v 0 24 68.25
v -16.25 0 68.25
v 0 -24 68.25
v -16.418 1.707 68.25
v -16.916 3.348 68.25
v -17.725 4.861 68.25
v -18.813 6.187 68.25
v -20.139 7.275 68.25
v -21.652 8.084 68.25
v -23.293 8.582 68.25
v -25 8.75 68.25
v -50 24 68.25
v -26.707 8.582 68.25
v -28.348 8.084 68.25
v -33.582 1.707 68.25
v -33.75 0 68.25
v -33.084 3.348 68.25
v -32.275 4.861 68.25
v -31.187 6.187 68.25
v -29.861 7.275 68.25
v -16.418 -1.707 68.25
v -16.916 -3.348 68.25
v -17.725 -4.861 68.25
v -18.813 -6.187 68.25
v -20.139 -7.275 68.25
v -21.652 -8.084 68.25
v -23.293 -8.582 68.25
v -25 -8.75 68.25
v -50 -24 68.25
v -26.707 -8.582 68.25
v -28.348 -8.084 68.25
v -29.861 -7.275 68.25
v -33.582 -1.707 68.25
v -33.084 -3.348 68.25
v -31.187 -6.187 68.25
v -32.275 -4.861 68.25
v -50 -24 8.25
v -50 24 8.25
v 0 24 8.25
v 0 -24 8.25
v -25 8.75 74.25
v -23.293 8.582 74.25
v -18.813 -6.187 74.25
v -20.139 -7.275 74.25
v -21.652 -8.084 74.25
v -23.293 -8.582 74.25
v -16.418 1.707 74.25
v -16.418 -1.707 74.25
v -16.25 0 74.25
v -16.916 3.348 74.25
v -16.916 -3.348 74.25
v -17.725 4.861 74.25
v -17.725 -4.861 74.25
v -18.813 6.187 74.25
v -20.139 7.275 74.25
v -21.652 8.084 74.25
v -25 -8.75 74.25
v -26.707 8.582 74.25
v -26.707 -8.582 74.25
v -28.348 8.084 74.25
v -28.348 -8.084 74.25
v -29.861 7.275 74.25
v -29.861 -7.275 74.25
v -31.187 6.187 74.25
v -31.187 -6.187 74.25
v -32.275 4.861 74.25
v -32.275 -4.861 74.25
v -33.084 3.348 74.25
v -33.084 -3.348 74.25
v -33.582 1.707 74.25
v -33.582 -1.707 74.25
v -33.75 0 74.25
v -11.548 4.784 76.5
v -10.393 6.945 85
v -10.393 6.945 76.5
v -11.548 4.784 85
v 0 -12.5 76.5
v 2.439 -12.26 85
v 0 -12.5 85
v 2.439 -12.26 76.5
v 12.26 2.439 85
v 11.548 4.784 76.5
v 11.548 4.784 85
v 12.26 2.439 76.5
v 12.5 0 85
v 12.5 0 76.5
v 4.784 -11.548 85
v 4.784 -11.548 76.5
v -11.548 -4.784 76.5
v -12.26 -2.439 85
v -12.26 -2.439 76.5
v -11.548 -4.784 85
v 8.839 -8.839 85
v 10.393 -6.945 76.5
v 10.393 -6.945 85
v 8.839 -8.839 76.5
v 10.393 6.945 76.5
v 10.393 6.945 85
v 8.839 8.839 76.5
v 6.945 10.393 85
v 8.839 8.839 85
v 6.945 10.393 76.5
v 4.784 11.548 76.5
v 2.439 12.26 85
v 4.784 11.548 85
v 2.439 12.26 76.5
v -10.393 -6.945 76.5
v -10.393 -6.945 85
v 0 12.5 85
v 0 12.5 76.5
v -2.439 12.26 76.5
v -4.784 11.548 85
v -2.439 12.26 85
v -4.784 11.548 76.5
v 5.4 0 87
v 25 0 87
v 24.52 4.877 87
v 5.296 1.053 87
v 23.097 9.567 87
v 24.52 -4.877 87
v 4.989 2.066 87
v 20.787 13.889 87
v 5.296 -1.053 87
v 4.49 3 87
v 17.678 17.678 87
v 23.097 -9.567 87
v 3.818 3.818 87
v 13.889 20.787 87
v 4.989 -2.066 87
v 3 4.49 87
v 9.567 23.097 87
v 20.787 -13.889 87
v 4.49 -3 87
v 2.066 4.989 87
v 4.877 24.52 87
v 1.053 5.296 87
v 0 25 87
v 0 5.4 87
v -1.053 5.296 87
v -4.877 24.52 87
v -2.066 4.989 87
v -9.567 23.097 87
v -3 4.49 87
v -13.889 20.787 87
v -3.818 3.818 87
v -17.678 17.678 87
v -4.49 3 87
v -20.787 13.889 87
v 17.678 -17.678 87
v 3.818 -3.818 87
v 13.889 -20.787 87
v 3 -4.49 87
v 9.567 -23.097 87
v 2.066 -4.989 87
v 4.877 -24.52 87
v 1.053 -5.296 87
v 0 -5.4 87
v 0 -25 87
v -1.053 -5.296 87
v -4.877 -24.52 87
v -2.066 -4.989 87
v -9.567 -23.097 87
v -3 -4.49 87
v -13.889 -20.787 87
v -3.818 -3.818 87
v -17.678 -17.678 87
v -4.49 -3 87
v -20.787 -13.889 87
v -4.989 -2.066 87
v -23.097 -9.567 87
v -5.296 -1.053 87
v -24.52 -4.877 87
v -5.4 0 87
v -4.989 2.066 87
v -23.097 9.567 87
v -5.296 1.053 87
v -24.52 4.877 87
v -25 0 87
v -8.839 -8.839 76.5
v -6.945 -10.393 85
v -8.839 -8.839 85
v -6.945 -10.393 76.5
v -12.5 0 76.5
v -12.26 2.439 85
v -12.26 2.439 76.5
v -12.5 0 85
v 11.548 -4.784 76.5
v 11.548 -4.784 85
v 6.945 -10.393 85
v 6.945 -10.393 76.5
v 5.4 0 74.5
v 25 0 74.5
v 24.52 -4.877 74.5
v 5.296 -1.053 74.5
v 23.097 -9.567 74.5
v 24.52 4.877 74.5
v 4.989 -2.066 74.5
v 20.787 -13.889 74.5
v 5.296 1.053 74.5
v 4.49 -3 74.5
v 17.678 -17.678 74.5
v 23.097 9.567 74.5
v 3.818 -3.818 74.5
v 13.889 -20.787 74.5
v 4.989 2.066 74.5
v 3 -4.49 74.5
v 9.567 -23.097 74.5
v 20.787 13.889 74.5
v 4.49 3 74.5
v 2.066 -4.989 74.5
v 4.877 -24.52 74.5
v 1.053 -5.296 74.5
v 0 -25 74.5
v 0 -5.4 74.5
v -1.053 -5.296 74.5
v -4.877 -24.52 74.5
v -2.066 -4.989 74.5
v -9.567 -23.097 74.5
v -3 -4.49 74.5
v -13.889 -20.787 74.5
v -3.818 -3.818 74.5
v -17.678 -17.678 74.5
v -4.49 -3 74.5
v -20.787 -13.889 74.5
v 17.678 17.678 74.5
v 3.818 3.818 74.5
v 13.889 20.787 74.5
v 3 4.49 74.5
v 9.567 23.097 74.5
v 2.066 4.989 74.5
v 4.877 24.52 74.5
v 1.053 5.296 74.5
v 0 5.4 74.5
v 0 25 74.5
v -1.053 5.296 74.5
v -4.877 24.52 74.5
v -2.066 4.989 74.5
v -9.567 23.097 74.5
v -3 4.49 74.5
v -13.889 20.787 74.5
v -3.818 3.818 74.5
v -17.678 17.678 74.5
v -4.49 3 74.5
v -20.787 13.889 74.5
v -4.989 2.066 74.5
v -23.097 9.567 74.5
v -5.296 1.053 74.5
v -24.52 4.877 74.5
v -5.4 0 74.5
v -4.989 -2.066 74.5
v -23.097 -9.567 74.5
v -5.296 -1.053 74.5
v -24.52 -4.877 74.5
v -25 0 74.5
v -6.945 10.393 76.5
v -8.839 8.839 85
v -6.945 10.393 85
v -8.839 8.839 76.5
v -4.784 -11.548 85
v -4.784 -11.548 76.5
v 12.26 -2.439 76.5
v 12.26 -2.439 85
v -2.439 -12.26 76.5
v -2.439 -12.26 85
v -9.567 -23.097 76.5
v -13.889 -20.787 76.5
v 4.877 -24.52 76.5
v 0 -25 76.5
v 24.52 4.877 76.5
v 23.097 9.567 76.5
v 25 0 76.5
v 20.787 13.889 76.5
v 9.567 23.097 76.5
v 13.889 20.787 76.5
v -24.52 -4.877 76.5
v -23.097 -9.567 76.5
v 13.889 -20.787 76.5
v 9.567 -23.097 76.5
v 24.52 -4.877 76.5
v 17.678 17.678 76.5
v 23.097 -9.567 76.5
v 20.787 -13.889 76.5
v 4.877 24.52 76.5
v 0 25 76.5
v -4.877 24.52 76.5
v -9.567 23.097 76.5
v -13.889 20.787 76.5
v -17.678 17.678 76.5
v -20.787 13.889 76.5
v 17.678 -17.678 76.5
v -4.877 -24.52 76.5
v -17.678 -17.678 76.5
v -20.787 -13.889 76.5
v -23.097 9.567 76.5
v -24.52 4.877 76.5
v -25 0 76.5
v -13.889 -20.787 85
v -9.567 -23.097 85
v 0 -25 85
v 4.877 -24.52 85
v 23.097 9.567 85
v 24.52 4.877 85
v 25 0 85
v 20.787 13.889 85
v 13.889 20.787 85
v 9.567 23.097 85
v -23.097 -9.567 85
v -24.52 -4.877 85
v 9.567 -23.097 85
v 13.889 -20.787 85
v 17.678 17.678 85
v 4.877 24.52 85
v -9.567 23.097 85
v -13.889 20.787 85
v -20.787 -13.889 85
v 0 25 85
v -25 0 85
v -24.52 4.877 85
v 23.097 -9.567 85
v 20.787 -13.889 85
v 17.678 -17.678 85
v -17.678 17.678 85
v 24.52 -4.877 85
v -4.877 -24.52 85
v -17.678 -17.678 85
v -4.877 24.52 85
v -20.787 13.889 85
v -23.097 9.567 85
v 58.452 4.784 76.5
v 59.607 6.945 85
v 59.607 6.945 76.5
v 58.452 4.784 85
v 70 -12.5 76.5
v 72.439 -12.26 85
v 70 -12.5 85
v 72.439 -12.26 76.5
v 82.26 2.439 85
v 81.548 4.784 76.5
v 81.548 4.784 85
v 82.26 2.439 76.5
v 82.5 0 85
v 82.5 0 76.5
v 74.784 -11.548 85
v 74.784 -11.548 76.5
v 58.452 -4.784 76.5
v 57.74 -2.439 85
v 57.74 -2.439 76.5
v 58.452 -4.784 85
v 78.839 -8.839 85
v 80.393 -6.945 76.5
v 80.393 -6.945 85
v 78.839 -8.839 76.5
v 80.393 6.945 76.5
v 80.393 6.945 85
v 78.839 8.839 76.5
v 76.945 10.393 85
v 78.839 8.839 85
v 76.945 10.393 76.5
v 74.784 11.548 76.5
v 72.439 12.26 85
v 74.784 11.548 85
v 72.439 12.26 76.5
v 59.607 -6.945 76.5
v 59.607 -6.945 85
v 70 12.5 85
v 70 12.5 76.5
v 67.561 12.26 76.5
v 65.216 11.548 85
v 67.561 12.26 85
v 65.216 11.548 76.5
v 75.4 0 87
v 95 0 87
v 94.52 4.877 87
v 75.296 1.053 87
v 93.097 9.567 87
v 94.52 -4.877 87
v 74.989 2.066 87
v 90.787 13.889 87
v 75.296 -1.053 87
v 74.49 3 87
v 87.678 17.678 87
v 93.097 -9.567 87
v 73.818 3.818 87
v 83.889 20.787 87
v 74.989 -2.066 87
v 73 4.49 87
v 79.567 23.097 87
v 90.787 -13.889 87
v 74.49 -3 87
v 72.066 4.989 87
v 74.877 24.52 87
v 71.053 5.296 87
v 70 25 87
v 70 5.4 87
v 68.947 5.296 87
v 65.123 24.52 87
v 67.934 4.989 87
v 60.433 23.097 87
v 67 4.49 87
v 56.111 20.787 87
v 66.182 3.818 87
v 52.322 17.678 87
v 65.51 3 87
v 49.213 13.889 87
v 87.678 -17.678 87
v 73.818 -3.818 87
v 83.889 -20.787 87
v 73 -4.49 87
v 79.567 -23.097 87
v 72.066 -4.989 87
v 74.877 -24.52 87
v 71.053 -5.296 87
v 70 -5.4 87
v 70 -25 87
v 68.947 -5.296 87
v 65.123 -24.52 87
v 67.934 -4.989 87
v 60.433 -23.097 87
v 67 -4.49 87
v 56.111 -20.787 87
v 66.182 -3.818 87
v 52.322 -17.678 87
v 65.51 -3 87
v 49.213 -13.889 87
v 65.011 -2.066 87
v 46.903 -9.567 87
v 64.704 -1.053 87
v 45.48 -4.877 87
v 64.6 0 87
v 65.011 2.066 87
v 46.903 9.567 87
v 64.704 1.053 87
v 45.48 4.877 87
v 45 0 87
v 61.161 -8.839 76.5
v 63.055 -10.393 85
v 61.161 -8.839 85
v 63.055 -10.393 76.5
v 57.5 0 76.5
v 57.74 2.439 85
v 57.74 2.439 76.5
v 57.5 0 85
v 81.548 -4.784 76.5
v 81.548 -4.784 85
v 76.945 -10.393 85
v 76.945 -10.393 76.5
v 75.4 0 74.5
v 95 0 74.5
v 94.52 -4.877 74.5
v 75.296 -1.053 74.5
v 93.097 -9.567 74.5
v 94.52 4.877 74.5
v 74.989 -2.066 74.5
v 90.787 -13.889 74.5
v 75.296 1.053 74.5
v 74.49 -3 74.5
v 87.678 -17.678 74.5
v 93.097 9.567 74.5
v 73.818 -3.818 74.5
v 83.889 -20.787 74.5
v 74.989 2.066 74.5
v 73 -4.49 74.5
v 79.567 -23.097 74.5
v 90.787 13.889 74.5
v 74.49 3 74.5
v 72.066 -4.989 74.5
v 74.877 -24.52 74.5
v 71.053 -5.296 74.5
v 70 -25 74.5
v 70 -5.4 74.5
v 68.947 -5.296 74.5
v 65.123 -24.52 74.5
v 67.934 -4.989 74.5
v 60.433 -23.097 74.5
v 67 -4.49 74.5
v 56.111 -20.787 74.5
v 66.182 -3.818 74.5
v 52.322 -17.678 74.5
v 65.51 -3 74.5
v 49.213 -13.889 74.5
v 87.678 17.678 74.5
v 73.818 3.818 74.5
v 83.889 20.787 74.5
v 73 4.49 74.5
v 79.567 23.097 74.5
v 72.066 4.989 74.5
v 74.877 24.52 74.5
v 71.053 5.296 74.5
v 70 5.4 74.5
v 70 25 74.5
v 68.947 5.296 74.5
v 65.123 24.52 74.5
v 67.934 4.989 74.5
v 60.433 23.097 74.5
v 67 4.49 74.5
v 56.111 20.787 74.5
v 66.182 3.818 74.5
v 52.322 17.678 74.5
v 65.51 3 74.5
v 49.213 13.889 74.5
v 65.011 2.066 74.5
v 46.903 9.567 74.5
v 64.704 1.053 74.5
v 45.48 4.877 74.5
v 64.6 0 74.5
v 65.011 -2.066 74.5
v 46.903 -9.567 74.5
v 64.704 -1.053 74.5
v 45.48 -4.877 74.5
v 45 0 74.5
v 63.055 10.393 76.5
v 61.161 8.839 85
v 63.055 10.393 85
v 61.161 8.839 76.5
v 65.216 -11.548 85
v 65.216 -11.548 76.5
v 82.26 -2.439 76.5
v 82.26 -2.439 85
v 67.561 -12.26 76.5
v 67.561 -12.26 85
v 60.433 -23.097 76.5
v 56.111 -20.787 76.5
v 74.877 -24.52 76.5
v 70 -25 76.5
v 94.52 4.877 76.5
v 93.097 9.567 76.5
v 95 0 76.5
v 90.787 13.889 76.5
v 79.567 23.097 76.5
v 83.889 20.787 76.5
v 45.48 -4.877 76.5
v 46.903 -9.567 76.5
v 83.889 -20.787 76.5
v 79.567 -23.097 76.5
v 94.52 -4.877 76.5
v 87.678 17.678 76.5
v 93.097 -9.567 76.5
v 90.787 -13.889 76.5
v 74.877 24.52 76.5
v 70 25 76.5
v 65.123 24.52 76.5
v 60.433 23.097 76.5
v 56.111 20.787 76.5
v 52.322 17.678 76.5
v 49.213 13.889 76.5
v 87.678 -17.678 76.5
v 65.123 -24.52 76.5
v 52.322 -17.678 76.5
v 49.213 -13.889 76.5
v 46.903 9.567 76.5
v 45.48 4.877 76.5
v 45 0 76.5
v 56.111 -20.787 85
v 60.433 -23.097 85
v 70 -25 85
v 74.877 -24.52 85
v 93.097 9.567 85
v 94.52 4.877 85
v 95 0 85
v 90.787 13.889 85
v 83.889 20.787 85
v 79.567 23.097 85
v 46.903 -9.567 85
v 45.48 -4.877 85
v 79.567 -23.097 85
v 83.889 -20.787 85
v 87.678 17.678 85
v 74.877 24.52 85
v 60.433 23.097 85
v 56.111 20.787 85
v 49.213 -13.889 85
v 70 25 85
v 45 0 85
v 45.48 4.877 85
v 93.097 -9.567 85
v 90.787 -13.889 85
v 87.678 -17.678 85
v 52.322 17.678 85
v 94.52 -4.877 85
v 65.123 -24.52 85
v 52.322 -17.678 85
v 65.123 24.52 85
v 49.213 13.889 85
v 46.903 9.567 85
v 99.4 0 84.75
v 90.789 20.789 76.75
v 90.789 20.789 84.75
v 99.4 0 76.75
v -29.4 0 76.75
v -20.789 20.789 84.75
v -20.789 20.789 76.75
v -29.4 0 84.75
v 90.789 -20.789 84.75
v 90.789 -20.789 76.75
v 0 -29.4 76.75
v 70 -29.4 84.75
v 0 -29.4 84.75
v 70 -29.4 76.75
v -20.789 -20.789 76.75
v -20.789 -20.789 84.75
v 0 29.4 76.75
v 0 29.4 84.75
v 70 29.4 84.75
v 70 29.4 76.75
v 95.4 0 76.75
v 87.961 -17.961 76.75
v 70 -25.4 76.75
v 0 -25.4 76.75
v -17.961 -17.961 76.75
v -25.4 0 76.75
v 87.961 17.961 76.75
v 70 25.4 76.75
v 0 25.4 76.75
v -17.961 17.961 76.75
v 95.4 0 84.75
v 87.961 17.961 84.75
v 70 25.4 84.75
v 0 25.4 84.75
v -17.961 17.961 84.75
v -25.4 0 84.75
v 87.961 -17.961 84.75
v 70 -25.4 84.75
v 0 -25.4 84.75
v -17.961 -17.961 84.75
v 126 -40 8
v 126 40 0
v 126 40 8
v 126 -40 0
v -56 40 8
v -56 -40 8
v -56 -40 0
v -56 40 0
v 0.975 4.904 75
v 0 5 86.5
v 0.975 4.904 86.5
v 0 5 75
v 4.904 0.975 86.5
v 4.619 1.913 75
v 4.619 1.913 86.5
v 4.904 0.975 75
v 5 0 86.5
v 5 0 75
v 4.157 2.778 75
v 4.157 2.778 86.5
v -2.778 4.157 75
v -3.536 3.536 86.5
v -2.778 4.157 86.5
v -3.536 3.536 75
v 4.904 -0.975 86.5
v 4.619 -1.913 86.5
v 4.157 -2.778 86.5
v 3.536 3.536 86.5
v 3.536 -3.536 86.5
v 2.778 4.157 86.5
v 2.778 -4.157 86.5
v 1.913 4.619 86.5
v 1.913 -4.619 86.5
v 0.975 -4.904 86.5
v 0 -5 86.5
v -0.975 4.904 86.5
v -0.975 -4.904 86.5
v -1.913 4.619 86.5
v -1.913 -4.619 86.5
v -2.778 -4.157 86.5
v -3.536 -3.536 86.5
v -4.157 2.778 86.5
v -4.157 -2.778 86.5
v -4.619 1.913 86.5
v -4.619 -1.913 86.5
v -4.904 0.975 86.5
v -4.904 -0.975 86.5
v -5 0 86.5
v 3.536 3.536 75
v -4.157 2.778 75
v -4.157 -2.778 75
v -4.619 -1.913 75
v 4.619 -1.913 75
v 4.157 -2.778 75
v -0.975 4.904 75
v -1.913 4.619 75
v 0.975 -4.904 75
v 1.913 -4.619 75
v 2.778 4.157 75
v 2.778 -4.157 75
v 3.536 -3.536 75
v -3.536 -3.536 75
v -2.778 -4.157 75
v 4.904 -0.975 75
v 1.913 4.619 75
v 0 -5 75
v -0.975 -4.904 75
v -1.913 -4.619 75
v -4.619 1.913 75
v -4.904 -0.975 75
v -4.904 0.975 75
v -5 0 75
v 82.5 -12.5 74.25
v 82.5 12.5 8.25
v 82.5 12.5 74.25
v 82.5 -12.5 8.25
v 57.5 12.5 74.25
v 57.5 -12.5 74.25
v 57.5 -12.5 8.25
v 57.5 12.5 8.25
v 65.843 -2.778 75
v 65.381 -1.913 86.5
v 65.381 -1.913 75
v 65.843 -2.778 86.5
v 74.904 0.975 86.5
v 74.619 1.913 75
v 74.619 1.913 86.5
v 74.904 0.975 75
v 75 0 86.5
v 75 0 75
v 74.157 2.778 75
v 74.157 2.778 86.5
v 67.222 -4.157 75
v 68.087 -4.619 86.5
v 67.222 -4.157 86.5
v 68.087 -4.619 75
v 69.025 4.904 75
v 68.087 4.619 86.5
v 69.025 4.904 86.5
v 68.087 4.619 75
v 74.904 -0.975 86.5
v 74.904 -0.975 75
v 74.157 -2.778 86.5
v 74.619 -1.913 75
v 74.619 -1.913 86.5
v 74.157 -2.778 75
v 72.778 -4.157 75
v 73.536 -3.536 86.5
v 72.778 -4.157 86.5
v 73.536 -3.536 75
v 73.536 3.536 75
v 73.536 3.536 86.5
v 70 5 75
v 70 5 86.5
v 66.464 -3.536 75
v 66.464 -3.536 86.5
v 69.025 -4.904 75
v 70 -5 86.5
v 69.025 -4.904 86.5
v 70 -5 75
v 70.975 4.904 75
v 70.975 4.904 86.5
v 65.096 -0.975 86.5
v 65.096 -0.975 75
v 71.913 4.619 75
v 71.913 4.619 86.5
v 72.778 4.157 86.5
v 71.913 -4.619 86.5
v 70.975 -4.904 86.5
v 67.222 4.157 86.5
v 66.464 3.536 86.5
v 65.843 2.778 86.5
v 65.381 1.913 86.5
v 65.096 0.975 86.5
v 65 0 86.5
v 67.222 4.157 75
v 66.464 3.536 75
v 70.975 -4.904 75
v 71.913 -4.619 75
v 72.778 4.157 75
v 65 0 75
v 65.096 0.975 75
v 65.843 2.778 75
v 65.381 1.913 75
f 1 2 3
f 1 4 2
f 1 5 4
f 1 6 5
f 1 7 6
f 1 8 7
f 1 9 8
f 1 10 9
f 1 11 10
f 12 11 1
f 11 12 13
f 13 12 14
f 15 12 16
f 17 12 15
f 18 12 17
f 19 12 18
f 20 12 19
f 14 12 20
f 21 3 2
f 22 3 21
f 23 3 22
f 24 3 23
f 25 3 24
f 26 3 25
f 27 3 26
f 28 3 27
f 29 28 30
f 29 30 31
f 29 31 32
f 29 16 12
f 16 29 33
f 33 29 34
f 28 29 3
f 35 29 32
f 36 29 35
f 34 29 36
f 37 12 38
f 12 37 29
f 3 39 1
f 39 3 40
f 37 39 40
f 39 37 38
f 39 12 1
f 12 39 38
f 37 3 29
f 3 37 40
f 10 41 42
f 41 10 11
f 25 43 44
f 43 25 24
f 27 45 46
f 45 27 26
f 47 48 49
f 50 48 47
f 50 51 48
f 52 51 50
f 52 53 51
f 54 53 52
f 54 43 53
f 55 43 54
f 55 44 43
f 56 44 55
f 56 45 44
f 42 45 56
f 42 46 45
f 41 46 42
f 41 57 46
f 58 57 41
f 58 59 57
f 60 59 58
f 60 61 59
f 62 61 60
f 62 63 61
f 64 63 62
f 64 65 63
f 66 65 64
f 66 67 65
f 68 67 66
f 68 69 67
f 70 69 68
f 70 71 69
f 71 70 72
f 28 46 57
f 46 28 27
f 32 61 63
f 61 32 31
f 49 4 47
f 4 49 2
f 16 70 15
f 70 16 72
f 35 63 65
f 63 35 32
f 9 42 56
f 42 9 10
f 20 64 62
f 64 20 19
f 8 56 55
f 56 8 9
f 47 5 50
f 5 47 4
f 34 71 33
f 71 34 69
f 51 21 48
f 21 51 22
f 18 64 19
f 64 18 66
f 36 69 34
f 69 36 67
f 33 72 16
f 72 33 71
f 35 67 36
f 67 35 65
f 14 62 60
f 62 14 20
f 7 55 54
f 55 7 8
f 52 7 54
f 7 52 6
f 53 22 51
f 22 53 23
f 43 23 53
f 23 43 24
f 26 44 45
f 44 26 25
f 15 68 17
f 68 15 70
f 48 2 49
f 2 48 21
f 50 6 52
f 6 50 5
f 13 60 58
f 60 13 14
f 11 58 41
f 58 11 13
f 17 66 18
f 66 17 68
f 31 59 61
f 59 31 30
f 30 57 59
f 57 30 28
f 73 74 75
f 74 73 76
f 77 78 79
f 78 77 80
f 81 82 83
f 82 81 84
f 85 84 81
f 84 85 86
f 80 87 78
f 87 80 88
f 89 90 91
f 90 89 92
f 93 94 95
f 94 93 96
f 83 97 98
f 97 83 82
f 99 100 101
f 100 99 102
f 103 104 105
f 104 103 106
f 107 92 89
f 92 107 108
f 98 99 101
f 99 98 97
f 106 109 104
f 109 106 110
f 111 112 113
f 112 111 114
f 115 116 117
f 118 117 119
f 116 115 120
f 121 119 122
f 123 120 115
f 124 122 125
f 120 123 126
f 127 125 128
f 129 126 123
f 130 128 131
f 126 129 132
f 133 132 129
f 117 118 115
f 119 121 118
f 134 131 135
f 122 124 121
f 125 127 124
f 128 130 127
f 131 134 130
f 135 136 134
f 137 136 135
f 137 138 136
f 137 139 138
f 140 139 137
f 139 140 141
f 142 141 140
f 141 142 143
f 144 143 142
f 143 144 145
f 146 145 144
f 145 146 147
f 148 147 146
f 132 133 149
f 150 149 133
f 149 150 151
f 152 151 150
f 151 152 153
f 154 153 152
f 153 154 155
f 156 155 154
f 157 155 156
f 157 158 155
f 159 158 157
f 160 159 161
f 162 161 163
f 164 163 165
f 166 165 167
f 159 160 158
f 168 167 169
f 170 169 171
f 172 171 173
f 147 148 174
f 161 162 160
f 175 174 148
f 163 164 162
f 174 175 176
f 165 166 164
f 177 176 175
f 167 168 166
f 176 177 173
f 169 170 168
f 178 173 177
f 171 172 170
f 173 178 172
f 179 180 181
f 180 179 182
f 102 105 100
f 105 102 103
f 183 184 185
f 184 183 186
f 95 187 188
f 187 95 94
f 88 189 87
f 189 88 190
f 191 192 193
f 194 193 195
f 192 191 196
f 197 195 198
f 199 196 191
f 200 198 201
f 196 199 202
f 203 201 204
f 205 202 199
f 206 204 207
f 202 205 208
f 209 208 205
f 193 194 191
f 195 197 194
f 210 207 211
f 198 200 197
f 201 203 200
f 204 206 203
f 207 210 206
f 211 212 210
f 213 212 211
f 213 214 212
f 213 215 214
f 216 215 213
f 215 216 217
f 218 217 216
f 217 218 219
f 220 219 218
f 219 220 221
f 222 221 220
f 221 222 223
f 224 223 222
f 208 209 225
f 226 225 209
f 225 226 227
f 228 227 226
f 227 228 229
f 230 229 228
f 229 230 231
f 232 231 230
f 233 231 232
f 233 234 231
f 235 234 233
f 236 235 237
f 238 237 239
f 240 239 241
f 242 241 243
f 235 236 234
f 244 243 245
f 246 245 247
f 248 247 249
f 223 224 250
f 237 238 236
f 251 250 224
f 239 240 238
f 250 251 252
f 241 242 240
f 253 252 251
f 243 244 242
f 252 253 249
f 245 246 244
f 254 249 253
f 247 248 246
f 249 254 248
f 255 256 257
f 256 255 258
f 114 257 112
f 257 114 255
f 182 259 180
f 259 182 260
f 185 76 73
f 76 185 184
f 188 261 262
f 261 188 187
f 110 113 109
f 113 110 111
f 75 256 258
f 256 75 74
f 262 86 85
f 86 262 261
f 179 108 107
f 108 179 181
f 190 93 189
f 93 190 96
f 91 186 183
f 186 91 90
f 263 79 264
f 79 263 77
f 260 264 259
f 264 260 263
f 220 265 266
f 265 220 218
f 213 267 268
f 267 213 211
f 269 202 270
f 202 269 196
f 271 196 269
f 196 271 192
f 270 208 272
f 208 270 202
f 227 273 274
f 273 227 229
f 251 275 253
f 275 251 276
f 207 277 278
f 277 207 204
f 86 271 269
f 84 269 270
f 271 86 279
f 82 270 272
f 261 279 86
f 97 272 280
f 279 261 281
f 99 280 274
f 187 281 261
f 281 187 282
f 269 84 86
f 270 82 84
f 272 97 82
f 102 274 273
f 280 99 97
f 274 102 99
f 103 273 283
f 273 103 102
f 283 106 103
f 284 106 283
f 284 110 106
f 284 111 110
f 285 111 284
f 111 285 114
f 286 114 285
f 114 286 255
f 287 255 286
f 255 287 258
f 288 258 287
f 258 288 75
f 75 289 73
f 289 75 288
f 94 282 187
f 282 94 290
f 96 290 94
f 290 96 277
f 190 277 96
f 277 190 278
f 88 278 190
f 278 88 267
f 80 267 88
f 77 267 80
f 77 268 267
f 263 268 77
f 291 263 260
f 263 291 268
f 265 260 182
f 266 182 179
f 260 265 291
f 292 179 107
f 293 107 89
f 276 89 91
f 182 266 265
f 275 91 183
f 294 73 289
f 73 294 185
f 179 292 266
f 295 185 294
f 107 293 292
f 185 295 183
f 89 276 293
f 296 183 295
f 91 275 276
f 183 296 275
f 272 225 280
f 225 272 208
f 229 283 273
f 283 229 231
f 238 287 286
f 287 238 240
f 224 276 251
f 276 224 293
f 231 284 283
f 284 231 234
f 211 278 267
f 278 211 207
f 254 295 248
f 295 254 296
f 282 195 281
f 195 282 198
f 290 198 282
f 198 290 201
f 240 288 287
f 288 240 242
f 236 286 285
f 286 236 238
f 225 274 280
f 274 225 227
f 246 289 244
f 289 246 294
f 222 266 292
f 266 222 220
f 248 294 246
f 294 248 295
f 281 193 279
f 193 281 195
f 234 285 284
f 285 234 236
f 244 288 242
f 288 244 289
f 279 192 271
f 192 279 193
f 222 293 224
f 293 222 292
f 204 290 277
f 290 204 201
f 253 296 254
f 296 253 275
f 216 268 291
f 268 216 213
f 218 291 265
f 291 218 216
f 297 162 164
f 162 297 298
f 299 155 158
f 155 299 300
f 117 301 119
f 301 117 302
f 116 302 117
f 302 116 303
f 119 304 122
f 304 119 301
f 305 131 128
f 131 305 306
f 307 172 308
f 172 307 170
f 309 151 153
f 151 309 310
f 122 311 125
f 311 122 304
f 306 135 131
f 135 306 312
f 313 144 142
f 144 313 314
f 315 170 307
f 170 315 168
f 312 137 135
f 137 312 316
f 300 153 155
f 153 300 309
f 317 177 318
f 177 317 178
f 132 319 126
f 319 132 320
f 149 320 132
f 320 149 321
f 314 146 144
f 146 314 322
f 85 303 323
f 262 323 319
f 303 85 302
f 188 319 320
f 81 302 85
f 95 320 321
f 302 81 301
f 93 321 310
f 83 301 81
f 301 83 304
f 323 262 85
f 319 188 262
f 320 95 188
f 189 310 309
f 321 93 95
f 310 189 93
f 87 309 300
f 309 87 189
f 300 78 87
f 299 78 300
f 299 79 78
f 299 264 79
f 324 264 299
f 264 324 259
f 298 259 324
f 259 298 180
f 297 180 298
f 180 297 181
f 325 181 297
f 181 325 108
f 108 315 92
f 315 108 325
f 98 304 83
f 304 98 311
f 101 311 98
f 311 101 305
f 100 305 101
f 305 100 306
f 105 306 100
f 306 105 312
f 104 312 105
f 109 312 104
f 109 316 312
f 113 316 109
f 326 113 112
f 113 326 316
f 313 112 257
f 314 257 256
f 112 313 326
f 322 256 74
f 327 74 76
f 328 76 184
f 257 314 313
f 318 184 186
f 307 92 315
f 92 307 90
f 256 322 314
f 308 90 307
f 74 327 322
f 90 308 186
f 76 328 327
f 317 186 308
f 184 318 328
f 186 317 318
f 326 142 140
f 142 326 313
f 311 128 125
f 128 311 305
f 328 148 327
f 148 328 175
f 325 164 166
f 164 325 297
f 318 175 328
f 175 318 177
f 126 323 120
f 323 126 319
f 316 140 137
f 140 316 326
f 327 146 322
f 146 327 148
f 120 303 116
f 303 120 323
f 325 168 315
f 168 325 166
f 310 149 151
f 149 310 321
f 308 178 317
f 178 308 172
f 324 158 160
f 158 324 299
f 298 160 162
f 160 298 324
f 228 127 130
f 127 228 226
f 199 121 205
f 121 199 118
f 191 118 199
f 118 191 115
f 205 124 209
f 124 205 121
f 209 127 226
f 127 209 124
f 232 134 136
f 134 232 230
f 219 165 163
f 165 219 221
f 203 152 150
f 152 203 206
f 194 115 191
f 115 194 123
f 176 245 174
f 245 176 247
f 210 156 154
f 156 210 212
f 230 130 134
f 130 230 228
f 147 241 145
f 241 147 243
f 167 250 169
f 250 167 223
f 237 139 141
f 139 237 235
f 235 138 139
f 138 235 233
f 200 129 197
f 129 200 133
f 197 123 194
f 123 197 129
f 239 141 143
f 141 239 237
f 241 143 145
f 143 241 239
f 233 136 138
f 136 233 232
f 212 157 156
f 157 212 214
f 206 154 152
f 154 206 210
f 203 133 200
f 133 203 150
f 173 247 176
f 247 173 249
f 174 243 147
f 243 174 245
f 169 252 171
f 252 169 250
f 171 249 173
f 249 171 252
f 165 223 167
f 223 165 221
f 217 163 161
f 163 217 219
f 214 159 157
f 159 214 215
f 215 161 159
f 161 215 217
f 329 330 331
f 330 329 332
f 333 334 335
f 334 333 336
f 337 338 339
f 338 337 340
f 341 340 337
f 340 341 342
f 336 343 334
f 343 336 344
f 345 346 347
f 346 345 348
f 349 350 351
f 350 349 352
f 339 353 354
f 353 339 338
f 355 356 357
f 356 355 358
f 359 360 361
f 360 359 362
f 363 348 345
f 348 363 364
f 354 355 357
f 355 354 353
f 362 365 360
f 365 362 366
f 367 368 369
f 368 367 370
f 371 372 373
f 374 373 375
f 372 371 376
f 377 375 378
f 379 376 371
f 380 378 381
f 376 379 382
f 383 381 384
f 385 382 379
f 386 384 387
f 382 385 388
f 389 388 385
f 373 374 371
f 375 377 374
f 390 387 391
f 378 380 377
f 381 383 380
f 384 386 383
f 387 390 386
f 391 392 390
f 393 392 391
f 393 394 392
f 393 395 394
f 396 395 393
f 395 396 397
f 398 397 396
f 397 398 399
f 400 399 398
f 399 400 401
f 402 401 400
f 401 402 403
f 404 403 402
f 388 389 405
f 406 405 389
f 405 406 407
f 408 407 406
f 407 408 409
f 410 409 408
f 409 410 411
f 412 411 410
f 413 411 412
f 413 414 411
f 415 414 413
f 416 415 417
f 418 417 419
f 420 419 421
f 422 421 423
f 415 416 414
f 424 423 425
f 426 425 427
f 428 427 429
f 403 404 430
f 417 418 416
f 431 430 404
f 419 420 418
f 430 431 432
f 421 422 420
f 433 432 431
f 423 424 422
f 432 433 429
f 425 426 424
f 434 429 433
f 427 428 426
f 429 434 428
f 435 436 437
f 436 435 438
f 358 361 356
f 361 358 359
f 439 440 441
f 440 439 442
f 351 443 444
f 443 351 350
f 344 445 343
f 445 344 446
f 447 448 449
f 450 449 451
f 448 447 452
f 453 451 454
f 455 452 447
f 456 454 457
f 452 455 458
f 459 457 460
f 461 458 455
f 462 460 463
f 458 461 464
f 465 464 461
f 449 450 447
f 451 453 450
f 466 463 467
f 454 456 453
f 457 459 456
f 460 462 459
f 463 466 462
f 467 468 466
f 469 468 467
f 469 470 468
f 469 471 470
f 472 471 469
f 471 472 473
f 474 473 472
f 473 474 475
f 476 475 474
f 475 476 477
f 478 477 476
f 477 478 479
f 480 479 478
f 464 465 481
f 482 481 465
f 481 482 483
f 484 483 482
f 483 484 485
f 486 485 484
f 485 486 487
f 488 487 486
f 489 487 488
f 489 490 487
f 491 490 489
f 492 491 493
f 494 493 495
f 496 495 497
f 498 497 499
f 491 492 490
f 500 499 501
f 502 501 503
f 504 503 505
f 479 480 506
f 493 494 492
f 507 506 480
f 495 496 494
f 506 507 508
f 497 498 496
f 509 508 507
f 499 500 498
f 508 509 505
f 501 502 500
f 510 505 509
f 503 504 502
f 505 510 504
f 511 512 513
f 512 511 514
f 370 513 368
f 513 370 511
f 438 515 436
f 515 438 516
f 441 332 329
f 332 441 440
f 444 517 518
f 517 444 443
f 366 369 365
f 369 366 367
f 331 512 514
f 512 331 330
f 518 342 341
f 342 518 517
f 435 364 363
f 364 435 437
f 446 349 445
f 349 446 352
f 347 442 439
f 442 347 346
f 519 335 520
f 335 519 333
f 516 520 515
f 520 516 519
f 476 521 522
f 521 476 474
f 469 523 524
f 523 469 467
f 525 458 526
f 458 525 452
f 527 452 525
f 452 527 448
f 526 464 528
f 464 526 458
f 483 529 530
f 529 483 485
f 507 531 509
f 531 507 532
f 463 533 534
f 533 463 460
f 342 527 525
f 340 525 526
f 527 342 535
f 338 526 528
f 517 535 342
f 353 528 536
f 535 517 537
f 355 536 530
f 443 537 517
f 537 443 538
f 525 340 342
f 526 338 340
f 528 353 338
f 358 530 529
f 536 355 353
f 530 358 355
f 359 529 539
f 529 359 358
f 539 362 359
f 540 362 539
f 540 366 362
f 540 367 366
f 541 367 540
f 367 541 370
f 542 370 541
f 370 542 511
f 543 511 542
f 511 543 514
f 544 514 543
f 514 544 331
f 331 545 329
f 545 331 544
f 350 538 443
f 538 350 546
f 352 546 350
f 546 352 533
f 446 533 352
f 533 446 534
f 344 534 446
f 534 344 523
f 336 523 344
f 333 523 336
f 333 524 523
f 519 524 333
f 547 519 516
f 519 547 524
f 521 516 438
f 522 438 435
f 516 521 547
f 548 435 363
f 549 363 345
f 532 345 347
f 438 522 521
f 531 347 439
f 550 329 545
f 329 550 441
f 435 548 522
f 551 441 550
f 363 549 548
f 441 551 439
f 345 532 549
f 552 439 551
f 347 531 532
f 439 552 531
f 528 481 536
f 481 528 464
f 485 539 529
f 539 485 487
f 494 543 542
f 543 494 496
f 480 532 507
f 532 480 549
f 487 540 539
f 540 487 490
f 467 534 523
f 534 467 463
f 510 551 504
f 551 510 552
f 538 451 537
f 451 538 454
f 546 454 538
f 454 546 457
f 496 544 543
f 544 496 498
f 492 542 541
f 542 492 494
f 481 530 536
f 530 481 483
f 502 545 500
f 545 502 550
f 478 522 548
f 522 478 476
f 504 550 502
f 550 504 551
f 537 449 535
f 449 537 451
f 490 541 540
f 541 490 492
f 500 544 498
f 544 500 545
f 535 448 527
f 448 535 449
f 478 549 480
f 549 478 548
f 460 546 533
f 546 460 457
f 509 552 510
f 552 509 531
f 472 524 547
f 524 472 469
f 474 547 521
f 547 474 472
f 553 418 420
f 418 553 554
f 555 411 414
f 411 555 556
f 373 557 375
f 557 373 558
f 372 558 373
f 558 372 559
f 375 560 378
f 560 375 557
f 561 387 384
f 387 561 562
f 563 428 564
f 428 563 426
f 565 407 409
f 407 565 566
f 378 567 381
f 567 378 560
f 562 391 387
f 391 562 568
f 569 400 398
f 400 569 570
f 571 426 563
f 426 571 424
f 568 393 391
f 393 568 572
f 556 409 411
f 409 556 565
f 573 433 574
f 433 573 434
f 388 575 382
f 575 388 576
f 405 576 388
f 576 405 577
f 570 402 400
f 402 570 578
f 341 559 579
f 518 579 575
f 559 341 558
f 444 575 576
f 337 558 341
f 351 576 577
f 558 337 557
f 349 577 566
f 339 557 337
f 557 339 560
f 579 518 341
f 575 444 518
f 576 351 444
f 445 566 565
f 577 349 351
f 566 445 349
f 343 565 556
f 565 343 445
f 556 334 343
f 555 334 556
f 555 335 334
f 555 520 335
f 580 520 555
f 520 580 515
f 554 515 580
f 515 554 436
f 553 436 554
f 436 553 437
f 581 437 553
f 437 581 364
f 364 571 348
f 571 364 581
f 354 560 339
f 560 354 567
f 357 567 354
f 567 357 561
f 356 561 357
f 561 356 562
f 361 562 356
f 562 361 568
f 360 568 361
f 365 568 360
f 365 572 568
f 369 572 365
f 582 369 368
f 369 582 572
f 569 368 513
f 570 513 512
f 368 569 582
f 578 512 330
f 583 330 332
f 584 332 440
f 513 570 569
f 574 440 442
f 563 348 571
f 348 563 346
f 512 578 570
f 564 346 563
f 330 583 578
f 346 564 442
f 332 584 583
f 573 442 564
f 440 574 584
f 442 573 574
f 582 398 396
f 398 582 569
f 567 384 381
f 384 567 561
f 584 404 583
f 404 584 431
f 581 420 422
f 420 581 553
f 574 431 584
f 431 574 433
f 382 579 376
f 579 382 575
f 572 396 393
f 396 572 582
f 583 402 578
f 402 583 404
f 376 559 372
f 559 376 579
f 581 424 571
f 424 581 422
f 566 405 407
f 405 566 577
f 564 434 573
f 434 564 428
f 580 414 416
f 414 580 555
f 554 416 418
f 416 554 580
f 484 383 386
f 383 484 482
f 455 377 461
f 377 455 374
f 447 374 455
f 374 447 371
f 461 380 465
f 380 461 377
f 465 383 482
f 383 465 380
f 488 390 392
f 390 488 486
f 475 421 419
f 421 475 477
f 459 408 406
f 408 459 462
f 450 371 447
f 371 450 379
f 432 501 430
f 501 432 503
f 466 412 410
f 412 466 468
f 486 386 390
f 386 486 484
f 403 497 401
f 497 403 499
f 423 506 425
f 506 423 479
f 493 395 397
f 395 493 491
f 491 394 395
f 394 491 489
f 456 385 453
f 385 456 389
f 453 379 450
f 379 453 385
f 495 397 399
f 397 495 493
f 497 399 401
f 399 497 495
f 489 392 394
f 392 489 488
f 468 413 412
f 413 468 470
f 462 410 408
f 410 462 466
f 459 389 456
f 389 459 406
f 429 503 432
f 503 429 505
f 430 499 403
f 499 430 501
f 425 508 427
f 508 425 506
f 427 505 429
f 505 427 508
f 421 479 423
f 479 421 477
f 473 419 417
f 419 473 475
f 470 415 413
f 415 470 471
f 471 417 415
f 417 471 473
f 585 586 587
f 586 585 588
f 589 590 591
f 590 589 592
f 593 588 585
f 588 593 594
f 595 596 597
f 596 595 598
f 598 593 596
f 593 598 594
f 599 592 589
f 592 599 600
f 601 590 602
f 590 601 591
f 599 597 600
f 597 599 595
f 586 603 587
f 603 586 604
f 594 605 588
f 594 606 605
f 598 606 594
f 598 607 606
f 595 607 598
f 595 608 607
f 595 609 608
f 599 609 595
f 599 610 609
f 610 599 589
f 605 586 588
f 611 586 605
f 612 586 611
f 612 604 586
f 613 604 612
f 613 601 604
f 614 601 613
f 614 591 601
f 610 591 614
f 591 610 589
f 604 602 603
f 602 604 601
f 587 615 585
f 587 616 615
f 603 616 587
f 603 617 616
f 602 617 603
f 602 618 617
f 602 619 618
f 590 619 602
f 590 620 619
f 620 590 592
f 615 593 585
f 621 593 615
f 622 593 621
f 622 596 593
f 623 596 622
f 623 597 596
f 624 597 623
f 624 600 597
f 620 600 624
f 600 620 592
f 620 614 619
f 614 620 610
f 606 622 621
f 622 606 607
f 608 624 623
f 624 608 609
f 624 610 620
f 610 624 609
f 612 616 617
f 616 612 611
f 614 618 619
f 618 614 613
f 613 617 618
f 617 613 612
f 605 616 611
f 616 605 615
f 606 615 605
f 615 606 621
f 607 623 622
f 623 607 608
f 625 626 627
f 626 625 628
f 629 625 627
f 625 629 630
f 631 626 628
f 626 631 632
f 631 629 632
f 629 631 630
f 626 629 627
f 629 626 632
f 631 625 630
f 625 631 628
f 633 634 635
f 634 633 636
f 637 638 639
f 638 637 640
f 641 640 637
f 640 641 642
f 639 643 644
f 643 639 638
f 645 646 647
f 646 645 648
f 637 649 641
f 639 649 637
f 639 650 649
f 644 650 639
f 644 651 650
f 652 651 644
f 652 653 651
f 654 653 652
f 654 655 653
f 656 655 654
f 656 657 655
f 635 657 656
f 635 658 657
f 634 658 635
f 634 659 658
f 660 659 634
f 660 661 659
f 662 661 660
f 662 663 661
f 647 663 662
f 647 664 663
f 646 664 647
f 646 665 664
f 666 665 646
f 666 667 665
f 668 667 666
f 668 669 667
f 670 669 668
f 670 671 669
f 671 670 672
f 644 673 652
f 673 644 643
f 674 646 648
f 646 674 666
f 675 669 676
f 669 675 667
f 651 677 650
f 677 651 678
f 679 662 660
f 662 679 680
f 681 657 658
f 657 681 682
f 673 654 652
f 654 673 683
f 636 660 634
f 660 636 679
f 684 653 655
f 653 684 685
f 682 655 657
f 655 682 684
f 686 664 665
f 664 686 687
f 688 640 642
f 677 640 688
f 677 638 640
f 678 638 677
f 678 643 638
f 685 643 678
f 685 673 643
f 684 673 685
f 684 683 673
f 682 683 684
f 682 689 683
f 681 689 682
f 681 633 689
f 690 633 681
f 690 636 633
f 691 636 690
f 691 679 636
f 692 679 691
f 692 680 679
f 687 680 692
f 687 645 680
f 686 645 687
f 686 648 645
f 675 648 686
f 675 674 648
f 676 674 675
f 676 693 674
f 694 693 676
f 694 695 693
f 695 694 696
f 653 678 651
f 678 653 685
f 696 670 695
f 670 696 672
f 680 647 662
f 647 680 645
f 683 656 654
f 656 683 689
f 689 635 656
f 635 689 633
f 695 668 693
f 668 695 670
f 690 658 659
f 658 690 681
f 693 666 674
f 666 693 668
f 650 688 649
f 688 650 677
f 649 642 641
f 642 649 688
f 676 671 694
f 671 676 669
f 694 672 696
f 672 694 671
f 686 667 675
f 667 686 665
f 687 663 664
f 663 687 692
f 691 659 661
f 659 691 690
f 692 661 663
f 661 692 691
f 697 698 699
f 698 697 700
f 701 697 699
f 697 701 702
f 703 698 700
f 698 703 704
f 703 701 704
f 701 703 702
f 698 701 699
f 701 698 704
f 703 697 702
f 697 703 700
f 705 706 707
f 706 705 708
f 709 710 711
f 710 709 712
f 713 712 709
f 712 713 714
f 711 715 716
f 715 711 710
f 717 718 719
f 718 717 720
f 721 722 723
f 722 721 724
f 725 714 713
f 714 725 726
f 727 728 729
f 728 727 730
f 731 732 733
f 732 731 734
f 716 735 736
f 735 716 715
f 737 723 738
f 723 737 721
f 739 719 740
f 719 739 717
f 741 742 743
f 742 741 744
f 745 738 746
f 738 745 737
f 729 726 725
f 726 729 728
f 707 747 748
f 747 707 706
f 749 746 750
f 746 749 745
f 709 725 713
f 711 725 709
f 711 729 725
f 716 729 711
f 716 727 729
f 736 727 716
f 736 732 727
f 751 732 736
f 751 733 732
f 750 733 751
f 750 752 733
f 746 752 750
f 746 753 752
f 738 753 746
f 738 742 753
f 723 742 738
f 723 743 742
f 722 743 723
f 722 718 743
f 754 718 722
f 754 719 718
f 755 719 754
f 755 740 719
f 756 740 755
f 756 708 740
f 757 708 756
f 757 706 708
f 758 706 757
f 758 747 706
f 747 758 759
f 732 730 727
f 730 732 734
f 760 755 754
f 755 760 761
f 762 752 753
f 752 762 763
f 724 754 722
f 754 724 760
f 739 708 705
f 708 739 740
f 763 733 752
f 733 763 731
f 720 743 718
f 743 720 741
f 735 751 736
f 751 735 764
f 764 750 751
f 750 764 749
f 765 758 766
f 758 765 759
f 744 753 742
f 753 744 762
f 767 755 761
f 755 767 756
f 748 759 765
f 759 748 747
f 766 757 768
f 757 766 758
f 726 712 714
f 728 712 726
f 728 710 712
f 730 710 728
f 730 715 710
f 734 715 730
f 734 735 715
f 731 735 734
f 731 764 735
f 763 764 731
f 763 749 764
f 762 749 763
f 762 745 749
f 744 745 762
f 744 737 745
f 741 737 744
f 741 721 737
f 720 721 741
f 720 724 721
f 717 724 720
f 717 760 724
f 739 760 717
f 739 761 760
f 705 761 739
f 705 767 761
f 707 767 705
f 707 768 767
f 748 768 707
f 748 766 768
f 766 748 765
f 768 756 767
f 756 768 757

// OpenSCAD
$fn = 32;

// ------------------------------------------------------------------------
// Motor belt drive: span 70 mm, pulleys d50, belt 8 mm wide
// Every part is its own module, assembly() places every instance.
// ------------------------------------------------------------------------

// --- part 1 ---
module base_plate() {
  difference() {
    translate([-91, -40, 0]) cube([182, 80, 8]);
  }
}

// --- part 2 ---
module motor() {
  union() {
    translate([-30, -24, 0]) cube([60, 48, 50]);
    translate([33, 0, 25]) rotate([0, 90, 0]) cylinder(h = 6, d = 17.5, center = true);
  }
}

// --- part 3 ---
module drive_shaft() {
  translate([0, 0, -5.75]) cylinder(h = 11.5, d = 10);
}

// --- part 4 ---
module pulley_drive() {
  difference() {
    union() {
      cylinder(h = 12.5, d = 25);
      cylinder(h = 2, d = 50);
      translate([0, 0, 10.5]) cylinder(h = 2, d = 50);
    }
    translate([0, 0, -1]) cylinder(h = 14.5, d = 10.8);
  }
}

// --- part 5 ---
module idler_post() {
  translate([-12.5, -12.5, 0]) cube([25, 25, 66]);
}

// --- part 6 ---
module driven_shaft() {
  translate([0, 0, -5.75]) cylinder(h = 11.5, d = 10);
}

// --- part 7 ---
module pulley_driven() {
  difference() {
    union() {
      cylinder(h = 12.5, d = 25);
      cylinder(h = 2, d = 50);
      translate([0, 0, 10.5]) cylinder(h = 2, d = 50);
    }
    translate([0, 0, -1]) cylinder(h = 14.5, d = 10.8);
  }
}

// --- part 8 ---
module drive_belt() {
  difference() {
    linear_extrude(height = 8) polygon(points = concat([for (a = [90 : 45 : 270]) [29.4 * cos(a), 29.4 * sin(a)]], [for (a = [270 : 45 : 450]) [70 + 29.4 * cos(a), 29.4 * sin(a)]]));
    translate([0, 0, -1]) linear_extrude(height = 10) polygon(points = concat([for (a = [90 : 45 : 270]) [25.4 * cos(a), 25.4 * sin(a)]], [for (a = [270 : 45 : 450]) [70 + 25.4 * cos(a), 25.4 * sin(a)]]));
  }
}

// --- assembly ---
module assembly() {
  color([0.80, 0.24, 0.20]) translate([35, 0, 0]) rotate([0, 0, 0]) base_plate();
  color([0.20, 0.45, 0.75]) translate([0, 0, 38.25]) rotate([0, 270, 0]) motor();
  color([0.25, 0.62, 0.32]) translate([0, 0, 80.75]) rotate([0, 0, 0]) drive_shaft();
  color([0.92, 0.70, 0.18]) translate([0, 0, 74.5]) rotate([0, 0, 0]) pulley_drive();
  color([0.58, 0.35, 0.70]) translate([70, 0, 8.25]) rotate([0, 0, 0]) idler_post();
  color([0.16, 0.66, 0.66]) translate([70, 0, 80.75]) rotate([0, 0, 0]) driven_shaft();
  color([0.85, 0.48, 0.18]) translate([70, 0, 74.5]) rotate([0, 0, 0]) pulley_driven();
  color([0.55, 0.60, 0.65]) translate([0, 0, 76.75]) rotate([0, 0, 0]) drive_belt();
}

assembly();
